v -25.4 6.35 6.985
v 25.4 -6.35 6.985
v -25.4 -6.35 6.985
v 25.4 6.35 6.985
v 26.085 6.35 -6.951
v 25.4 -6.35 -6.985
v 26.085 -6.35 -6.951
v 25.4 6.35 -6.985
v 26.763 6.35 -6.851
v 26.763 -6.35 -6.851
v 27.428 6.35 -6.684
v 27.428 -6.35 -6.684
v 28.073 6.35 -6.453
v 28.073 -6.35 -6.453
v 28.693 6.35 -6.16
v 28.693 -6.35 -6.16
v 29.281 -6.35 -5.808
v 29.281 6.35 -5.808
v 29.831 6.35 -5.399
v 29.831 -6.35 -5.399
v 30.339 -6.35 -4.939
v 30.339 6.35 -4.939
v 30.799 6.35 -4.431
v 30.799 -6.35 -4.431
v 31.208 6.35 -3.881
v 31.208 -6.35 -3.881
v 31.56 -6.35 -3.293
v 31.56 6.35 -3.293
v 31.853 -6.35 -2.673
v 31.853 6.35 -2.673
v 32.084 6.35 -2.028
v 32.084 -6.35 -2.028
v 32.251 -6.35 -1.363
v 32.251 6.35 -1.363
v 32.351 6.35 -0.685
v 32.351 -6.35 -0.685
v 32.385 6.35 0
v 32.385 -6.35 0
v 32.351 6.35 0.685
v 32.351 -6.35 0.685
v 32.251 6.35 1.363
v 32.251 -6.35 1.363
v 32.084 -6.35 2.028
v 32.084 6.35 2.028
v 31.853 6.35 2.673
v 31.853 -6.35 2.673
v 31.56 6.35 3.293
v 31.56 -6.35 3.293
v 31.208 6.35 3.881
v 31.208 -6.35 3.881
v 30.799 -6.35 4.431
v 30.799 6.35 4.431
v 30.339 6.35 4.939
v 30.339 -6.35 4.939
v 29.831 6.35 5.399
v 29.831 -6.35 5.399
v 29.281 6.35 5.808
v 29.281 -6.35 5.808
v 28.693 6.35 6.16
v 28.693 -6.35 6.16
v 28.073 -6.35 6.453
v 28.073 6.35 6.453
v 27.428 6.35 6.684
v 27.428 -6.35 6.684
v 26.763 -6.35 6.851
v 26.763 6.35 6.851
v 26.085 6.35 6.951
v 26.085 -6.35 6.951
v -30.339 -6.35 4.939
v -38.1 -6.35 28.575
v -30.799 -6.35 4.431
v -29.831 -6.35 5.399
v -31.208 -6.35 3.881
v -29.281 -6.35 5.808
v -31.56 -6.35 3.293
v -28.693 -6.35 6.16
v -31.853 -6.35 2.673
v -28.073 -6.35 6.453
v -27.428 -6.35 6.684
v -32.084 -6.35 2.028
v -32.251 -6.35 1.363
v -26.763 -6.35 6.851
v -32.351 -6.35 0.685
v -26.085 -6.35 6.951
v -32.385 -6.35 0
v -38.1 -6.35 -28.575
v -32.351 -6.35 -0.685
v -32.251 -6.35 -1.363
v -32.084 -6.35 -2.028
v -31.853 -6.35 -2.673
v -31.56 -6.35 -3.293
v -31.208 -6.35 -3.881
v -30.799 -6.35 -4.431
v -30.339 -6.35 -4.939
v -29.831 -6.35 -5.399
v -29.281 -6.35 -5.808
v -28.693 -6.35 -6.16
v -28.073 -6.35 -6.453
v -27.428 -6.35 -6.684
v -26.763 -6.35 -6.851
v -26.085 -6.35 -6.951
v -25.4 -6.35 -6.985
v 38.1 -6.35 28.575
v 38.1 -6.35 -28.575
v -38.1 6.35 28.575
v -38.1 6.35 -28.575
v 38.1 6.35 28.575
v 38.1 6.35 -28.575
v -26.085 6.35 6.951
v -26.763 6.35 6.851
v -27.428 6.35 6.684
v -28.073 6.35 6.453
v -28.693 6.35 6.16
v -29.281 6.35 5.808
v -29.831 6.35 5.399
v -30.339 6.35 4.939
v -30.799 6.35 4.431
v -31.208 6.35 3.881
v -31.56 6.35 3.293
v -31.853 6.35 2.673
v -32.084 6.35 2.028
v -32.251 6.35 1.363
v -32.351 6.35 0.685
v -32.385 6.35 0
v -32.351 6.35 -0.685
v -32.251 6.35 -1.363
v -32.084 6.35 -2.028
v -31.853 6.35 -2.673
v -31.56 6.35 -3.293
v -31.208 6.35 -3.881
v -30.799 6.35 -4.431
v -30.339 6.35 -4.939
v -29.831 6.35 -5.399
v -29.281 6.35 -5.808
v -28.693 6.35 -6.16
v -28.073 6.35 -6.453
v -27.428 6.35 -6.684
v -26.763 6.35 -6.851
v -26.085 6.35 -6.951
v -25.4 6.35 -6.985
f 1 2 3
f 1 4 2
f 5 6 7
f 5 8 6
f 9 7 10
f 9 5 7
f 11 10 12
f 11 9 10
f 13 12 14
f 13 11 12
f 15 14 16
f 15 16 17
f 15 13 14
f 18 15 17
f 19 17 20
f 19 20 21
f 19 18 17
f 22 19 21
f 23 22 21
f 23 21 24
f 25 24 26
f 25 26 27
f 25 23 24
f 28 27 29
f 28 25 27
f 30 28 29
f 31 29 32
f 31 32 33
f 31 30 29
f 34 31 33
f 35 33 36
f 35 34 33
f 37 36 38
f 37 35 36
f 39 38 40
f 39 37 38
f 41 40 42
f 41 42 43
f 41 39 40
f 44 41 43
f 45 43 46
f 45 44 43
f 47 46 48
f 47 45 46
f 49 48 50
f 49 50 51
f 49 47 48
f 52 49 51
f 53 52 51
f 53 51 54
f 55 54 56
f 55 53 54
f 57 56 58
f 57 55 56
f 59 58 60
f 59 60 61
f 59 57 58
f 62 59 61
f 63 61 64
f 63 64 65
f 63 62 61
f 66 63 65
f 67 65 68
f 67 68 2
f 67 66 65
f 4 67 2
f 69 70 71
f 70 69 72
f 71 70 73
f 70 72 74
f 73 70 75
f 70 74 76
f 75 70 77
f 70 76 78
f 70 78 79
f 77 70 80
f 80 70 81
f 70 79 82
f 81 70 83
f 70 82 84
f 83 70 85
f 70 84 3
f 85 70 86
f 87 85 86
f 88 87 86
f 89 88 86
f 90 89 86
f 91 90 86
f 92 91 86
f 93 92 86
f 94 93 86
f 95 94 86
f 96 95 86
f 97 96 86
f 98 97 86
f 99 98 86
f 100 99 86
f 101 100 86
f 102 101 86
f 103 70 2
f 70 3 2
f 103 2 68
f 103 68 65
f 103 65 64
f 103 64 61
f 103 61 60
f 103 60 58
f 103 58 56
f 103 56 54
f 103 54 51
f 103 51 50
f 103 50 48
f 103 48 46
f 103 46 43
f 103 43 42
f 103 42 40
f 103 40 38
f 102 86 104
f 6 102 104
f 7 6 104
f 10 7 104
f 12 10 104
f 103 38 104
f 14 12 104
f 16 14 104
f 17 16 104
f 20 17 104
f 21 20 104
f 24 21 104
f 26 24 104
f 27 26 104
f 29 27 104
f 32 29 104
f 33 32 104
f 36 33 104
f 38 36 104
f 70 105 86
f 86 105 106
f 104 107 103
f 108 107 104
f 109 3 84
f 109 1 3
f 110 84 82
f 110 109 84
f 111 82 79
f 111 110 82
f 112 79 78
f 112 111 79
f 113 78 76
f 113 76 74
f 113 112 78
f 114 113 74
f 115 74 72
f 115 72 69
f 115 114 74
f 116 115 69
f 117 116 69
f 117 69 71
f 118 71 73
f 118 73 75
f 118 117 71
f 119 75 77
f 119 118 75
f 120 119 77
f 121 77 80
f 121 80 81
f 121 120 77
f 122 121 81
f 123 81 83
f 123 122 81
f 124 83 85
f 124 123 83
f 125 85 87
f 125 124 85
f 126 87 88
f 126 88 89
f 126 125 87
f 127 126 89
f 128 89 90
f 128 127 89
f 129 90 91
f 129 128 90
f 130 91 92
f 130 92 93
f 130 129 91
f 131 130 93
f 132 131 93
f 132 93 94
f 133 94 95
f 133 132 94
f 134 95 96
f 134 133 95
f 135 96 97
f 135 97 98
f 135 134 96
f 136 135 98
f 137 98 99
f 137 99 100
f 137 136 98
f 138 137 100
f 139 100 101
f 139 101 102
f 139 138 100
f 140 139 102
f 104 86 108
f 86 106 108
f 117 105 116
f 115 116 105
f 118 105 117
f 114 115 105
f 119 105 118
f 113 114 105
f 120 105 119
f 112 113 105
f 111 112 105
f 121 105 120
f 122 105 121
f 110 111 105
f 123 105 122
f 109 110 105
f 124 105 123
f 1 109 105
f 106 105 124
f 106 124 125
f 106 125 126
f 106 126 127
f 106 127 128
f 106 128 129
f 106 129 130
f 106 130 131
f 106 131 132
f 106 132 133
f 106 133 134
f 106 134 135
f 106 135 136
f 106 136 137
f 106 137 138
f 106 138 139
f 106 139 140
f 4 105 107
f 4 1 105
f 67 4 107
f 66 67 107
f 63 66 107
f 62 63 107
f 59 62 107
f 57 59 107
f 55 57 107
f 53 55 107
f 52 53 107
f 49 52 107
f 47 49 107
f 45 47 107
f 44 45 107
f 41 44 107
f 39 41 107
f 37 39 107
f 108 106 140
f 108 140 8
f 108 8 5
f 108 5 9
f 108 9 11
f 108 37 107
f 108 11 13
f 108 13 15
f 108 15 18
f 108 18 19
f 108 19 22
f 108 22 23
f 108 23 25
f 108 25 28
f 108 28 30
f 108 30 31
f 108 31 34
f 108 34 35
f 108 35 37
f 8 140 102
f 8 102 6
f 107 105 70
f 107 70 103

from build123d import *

# Parameters (mm, degrees)
SKETCH1_W           = 76.2
SKETCH1_H           = 57.15
BOSS_EXTRUDE1_DEPTH = 6.35


with BuildPart() as part:
    # Sketch1 → Boss-Extrude1 (new, symmetric)
    with BuildSketch(Plane(origin=(0, 0, 0), x_dir=(1, 0, 0), z_dir=(0, 1, 0))):
        Rectangle(SKETCH1_W, SKETCH1_H)
        with BuildLine():
            Line((-25.4, 6.985), (25.4, 6.985))
            ThreePointArc((25.4, 6.985), (32.385, 0), (25.4, -6.985))
            Line((25.4, -6.985), (-25.4, -6.985))
            ThreePointArc((-25.4, -6.985), (-32.385, 0), (-25.4, 6.985))
        make_face(mode=Mode.SUBTRACT)
    extrude(amount=BOSS_EXTRUDE1_DEPTH, both=True)


solid = part.part
